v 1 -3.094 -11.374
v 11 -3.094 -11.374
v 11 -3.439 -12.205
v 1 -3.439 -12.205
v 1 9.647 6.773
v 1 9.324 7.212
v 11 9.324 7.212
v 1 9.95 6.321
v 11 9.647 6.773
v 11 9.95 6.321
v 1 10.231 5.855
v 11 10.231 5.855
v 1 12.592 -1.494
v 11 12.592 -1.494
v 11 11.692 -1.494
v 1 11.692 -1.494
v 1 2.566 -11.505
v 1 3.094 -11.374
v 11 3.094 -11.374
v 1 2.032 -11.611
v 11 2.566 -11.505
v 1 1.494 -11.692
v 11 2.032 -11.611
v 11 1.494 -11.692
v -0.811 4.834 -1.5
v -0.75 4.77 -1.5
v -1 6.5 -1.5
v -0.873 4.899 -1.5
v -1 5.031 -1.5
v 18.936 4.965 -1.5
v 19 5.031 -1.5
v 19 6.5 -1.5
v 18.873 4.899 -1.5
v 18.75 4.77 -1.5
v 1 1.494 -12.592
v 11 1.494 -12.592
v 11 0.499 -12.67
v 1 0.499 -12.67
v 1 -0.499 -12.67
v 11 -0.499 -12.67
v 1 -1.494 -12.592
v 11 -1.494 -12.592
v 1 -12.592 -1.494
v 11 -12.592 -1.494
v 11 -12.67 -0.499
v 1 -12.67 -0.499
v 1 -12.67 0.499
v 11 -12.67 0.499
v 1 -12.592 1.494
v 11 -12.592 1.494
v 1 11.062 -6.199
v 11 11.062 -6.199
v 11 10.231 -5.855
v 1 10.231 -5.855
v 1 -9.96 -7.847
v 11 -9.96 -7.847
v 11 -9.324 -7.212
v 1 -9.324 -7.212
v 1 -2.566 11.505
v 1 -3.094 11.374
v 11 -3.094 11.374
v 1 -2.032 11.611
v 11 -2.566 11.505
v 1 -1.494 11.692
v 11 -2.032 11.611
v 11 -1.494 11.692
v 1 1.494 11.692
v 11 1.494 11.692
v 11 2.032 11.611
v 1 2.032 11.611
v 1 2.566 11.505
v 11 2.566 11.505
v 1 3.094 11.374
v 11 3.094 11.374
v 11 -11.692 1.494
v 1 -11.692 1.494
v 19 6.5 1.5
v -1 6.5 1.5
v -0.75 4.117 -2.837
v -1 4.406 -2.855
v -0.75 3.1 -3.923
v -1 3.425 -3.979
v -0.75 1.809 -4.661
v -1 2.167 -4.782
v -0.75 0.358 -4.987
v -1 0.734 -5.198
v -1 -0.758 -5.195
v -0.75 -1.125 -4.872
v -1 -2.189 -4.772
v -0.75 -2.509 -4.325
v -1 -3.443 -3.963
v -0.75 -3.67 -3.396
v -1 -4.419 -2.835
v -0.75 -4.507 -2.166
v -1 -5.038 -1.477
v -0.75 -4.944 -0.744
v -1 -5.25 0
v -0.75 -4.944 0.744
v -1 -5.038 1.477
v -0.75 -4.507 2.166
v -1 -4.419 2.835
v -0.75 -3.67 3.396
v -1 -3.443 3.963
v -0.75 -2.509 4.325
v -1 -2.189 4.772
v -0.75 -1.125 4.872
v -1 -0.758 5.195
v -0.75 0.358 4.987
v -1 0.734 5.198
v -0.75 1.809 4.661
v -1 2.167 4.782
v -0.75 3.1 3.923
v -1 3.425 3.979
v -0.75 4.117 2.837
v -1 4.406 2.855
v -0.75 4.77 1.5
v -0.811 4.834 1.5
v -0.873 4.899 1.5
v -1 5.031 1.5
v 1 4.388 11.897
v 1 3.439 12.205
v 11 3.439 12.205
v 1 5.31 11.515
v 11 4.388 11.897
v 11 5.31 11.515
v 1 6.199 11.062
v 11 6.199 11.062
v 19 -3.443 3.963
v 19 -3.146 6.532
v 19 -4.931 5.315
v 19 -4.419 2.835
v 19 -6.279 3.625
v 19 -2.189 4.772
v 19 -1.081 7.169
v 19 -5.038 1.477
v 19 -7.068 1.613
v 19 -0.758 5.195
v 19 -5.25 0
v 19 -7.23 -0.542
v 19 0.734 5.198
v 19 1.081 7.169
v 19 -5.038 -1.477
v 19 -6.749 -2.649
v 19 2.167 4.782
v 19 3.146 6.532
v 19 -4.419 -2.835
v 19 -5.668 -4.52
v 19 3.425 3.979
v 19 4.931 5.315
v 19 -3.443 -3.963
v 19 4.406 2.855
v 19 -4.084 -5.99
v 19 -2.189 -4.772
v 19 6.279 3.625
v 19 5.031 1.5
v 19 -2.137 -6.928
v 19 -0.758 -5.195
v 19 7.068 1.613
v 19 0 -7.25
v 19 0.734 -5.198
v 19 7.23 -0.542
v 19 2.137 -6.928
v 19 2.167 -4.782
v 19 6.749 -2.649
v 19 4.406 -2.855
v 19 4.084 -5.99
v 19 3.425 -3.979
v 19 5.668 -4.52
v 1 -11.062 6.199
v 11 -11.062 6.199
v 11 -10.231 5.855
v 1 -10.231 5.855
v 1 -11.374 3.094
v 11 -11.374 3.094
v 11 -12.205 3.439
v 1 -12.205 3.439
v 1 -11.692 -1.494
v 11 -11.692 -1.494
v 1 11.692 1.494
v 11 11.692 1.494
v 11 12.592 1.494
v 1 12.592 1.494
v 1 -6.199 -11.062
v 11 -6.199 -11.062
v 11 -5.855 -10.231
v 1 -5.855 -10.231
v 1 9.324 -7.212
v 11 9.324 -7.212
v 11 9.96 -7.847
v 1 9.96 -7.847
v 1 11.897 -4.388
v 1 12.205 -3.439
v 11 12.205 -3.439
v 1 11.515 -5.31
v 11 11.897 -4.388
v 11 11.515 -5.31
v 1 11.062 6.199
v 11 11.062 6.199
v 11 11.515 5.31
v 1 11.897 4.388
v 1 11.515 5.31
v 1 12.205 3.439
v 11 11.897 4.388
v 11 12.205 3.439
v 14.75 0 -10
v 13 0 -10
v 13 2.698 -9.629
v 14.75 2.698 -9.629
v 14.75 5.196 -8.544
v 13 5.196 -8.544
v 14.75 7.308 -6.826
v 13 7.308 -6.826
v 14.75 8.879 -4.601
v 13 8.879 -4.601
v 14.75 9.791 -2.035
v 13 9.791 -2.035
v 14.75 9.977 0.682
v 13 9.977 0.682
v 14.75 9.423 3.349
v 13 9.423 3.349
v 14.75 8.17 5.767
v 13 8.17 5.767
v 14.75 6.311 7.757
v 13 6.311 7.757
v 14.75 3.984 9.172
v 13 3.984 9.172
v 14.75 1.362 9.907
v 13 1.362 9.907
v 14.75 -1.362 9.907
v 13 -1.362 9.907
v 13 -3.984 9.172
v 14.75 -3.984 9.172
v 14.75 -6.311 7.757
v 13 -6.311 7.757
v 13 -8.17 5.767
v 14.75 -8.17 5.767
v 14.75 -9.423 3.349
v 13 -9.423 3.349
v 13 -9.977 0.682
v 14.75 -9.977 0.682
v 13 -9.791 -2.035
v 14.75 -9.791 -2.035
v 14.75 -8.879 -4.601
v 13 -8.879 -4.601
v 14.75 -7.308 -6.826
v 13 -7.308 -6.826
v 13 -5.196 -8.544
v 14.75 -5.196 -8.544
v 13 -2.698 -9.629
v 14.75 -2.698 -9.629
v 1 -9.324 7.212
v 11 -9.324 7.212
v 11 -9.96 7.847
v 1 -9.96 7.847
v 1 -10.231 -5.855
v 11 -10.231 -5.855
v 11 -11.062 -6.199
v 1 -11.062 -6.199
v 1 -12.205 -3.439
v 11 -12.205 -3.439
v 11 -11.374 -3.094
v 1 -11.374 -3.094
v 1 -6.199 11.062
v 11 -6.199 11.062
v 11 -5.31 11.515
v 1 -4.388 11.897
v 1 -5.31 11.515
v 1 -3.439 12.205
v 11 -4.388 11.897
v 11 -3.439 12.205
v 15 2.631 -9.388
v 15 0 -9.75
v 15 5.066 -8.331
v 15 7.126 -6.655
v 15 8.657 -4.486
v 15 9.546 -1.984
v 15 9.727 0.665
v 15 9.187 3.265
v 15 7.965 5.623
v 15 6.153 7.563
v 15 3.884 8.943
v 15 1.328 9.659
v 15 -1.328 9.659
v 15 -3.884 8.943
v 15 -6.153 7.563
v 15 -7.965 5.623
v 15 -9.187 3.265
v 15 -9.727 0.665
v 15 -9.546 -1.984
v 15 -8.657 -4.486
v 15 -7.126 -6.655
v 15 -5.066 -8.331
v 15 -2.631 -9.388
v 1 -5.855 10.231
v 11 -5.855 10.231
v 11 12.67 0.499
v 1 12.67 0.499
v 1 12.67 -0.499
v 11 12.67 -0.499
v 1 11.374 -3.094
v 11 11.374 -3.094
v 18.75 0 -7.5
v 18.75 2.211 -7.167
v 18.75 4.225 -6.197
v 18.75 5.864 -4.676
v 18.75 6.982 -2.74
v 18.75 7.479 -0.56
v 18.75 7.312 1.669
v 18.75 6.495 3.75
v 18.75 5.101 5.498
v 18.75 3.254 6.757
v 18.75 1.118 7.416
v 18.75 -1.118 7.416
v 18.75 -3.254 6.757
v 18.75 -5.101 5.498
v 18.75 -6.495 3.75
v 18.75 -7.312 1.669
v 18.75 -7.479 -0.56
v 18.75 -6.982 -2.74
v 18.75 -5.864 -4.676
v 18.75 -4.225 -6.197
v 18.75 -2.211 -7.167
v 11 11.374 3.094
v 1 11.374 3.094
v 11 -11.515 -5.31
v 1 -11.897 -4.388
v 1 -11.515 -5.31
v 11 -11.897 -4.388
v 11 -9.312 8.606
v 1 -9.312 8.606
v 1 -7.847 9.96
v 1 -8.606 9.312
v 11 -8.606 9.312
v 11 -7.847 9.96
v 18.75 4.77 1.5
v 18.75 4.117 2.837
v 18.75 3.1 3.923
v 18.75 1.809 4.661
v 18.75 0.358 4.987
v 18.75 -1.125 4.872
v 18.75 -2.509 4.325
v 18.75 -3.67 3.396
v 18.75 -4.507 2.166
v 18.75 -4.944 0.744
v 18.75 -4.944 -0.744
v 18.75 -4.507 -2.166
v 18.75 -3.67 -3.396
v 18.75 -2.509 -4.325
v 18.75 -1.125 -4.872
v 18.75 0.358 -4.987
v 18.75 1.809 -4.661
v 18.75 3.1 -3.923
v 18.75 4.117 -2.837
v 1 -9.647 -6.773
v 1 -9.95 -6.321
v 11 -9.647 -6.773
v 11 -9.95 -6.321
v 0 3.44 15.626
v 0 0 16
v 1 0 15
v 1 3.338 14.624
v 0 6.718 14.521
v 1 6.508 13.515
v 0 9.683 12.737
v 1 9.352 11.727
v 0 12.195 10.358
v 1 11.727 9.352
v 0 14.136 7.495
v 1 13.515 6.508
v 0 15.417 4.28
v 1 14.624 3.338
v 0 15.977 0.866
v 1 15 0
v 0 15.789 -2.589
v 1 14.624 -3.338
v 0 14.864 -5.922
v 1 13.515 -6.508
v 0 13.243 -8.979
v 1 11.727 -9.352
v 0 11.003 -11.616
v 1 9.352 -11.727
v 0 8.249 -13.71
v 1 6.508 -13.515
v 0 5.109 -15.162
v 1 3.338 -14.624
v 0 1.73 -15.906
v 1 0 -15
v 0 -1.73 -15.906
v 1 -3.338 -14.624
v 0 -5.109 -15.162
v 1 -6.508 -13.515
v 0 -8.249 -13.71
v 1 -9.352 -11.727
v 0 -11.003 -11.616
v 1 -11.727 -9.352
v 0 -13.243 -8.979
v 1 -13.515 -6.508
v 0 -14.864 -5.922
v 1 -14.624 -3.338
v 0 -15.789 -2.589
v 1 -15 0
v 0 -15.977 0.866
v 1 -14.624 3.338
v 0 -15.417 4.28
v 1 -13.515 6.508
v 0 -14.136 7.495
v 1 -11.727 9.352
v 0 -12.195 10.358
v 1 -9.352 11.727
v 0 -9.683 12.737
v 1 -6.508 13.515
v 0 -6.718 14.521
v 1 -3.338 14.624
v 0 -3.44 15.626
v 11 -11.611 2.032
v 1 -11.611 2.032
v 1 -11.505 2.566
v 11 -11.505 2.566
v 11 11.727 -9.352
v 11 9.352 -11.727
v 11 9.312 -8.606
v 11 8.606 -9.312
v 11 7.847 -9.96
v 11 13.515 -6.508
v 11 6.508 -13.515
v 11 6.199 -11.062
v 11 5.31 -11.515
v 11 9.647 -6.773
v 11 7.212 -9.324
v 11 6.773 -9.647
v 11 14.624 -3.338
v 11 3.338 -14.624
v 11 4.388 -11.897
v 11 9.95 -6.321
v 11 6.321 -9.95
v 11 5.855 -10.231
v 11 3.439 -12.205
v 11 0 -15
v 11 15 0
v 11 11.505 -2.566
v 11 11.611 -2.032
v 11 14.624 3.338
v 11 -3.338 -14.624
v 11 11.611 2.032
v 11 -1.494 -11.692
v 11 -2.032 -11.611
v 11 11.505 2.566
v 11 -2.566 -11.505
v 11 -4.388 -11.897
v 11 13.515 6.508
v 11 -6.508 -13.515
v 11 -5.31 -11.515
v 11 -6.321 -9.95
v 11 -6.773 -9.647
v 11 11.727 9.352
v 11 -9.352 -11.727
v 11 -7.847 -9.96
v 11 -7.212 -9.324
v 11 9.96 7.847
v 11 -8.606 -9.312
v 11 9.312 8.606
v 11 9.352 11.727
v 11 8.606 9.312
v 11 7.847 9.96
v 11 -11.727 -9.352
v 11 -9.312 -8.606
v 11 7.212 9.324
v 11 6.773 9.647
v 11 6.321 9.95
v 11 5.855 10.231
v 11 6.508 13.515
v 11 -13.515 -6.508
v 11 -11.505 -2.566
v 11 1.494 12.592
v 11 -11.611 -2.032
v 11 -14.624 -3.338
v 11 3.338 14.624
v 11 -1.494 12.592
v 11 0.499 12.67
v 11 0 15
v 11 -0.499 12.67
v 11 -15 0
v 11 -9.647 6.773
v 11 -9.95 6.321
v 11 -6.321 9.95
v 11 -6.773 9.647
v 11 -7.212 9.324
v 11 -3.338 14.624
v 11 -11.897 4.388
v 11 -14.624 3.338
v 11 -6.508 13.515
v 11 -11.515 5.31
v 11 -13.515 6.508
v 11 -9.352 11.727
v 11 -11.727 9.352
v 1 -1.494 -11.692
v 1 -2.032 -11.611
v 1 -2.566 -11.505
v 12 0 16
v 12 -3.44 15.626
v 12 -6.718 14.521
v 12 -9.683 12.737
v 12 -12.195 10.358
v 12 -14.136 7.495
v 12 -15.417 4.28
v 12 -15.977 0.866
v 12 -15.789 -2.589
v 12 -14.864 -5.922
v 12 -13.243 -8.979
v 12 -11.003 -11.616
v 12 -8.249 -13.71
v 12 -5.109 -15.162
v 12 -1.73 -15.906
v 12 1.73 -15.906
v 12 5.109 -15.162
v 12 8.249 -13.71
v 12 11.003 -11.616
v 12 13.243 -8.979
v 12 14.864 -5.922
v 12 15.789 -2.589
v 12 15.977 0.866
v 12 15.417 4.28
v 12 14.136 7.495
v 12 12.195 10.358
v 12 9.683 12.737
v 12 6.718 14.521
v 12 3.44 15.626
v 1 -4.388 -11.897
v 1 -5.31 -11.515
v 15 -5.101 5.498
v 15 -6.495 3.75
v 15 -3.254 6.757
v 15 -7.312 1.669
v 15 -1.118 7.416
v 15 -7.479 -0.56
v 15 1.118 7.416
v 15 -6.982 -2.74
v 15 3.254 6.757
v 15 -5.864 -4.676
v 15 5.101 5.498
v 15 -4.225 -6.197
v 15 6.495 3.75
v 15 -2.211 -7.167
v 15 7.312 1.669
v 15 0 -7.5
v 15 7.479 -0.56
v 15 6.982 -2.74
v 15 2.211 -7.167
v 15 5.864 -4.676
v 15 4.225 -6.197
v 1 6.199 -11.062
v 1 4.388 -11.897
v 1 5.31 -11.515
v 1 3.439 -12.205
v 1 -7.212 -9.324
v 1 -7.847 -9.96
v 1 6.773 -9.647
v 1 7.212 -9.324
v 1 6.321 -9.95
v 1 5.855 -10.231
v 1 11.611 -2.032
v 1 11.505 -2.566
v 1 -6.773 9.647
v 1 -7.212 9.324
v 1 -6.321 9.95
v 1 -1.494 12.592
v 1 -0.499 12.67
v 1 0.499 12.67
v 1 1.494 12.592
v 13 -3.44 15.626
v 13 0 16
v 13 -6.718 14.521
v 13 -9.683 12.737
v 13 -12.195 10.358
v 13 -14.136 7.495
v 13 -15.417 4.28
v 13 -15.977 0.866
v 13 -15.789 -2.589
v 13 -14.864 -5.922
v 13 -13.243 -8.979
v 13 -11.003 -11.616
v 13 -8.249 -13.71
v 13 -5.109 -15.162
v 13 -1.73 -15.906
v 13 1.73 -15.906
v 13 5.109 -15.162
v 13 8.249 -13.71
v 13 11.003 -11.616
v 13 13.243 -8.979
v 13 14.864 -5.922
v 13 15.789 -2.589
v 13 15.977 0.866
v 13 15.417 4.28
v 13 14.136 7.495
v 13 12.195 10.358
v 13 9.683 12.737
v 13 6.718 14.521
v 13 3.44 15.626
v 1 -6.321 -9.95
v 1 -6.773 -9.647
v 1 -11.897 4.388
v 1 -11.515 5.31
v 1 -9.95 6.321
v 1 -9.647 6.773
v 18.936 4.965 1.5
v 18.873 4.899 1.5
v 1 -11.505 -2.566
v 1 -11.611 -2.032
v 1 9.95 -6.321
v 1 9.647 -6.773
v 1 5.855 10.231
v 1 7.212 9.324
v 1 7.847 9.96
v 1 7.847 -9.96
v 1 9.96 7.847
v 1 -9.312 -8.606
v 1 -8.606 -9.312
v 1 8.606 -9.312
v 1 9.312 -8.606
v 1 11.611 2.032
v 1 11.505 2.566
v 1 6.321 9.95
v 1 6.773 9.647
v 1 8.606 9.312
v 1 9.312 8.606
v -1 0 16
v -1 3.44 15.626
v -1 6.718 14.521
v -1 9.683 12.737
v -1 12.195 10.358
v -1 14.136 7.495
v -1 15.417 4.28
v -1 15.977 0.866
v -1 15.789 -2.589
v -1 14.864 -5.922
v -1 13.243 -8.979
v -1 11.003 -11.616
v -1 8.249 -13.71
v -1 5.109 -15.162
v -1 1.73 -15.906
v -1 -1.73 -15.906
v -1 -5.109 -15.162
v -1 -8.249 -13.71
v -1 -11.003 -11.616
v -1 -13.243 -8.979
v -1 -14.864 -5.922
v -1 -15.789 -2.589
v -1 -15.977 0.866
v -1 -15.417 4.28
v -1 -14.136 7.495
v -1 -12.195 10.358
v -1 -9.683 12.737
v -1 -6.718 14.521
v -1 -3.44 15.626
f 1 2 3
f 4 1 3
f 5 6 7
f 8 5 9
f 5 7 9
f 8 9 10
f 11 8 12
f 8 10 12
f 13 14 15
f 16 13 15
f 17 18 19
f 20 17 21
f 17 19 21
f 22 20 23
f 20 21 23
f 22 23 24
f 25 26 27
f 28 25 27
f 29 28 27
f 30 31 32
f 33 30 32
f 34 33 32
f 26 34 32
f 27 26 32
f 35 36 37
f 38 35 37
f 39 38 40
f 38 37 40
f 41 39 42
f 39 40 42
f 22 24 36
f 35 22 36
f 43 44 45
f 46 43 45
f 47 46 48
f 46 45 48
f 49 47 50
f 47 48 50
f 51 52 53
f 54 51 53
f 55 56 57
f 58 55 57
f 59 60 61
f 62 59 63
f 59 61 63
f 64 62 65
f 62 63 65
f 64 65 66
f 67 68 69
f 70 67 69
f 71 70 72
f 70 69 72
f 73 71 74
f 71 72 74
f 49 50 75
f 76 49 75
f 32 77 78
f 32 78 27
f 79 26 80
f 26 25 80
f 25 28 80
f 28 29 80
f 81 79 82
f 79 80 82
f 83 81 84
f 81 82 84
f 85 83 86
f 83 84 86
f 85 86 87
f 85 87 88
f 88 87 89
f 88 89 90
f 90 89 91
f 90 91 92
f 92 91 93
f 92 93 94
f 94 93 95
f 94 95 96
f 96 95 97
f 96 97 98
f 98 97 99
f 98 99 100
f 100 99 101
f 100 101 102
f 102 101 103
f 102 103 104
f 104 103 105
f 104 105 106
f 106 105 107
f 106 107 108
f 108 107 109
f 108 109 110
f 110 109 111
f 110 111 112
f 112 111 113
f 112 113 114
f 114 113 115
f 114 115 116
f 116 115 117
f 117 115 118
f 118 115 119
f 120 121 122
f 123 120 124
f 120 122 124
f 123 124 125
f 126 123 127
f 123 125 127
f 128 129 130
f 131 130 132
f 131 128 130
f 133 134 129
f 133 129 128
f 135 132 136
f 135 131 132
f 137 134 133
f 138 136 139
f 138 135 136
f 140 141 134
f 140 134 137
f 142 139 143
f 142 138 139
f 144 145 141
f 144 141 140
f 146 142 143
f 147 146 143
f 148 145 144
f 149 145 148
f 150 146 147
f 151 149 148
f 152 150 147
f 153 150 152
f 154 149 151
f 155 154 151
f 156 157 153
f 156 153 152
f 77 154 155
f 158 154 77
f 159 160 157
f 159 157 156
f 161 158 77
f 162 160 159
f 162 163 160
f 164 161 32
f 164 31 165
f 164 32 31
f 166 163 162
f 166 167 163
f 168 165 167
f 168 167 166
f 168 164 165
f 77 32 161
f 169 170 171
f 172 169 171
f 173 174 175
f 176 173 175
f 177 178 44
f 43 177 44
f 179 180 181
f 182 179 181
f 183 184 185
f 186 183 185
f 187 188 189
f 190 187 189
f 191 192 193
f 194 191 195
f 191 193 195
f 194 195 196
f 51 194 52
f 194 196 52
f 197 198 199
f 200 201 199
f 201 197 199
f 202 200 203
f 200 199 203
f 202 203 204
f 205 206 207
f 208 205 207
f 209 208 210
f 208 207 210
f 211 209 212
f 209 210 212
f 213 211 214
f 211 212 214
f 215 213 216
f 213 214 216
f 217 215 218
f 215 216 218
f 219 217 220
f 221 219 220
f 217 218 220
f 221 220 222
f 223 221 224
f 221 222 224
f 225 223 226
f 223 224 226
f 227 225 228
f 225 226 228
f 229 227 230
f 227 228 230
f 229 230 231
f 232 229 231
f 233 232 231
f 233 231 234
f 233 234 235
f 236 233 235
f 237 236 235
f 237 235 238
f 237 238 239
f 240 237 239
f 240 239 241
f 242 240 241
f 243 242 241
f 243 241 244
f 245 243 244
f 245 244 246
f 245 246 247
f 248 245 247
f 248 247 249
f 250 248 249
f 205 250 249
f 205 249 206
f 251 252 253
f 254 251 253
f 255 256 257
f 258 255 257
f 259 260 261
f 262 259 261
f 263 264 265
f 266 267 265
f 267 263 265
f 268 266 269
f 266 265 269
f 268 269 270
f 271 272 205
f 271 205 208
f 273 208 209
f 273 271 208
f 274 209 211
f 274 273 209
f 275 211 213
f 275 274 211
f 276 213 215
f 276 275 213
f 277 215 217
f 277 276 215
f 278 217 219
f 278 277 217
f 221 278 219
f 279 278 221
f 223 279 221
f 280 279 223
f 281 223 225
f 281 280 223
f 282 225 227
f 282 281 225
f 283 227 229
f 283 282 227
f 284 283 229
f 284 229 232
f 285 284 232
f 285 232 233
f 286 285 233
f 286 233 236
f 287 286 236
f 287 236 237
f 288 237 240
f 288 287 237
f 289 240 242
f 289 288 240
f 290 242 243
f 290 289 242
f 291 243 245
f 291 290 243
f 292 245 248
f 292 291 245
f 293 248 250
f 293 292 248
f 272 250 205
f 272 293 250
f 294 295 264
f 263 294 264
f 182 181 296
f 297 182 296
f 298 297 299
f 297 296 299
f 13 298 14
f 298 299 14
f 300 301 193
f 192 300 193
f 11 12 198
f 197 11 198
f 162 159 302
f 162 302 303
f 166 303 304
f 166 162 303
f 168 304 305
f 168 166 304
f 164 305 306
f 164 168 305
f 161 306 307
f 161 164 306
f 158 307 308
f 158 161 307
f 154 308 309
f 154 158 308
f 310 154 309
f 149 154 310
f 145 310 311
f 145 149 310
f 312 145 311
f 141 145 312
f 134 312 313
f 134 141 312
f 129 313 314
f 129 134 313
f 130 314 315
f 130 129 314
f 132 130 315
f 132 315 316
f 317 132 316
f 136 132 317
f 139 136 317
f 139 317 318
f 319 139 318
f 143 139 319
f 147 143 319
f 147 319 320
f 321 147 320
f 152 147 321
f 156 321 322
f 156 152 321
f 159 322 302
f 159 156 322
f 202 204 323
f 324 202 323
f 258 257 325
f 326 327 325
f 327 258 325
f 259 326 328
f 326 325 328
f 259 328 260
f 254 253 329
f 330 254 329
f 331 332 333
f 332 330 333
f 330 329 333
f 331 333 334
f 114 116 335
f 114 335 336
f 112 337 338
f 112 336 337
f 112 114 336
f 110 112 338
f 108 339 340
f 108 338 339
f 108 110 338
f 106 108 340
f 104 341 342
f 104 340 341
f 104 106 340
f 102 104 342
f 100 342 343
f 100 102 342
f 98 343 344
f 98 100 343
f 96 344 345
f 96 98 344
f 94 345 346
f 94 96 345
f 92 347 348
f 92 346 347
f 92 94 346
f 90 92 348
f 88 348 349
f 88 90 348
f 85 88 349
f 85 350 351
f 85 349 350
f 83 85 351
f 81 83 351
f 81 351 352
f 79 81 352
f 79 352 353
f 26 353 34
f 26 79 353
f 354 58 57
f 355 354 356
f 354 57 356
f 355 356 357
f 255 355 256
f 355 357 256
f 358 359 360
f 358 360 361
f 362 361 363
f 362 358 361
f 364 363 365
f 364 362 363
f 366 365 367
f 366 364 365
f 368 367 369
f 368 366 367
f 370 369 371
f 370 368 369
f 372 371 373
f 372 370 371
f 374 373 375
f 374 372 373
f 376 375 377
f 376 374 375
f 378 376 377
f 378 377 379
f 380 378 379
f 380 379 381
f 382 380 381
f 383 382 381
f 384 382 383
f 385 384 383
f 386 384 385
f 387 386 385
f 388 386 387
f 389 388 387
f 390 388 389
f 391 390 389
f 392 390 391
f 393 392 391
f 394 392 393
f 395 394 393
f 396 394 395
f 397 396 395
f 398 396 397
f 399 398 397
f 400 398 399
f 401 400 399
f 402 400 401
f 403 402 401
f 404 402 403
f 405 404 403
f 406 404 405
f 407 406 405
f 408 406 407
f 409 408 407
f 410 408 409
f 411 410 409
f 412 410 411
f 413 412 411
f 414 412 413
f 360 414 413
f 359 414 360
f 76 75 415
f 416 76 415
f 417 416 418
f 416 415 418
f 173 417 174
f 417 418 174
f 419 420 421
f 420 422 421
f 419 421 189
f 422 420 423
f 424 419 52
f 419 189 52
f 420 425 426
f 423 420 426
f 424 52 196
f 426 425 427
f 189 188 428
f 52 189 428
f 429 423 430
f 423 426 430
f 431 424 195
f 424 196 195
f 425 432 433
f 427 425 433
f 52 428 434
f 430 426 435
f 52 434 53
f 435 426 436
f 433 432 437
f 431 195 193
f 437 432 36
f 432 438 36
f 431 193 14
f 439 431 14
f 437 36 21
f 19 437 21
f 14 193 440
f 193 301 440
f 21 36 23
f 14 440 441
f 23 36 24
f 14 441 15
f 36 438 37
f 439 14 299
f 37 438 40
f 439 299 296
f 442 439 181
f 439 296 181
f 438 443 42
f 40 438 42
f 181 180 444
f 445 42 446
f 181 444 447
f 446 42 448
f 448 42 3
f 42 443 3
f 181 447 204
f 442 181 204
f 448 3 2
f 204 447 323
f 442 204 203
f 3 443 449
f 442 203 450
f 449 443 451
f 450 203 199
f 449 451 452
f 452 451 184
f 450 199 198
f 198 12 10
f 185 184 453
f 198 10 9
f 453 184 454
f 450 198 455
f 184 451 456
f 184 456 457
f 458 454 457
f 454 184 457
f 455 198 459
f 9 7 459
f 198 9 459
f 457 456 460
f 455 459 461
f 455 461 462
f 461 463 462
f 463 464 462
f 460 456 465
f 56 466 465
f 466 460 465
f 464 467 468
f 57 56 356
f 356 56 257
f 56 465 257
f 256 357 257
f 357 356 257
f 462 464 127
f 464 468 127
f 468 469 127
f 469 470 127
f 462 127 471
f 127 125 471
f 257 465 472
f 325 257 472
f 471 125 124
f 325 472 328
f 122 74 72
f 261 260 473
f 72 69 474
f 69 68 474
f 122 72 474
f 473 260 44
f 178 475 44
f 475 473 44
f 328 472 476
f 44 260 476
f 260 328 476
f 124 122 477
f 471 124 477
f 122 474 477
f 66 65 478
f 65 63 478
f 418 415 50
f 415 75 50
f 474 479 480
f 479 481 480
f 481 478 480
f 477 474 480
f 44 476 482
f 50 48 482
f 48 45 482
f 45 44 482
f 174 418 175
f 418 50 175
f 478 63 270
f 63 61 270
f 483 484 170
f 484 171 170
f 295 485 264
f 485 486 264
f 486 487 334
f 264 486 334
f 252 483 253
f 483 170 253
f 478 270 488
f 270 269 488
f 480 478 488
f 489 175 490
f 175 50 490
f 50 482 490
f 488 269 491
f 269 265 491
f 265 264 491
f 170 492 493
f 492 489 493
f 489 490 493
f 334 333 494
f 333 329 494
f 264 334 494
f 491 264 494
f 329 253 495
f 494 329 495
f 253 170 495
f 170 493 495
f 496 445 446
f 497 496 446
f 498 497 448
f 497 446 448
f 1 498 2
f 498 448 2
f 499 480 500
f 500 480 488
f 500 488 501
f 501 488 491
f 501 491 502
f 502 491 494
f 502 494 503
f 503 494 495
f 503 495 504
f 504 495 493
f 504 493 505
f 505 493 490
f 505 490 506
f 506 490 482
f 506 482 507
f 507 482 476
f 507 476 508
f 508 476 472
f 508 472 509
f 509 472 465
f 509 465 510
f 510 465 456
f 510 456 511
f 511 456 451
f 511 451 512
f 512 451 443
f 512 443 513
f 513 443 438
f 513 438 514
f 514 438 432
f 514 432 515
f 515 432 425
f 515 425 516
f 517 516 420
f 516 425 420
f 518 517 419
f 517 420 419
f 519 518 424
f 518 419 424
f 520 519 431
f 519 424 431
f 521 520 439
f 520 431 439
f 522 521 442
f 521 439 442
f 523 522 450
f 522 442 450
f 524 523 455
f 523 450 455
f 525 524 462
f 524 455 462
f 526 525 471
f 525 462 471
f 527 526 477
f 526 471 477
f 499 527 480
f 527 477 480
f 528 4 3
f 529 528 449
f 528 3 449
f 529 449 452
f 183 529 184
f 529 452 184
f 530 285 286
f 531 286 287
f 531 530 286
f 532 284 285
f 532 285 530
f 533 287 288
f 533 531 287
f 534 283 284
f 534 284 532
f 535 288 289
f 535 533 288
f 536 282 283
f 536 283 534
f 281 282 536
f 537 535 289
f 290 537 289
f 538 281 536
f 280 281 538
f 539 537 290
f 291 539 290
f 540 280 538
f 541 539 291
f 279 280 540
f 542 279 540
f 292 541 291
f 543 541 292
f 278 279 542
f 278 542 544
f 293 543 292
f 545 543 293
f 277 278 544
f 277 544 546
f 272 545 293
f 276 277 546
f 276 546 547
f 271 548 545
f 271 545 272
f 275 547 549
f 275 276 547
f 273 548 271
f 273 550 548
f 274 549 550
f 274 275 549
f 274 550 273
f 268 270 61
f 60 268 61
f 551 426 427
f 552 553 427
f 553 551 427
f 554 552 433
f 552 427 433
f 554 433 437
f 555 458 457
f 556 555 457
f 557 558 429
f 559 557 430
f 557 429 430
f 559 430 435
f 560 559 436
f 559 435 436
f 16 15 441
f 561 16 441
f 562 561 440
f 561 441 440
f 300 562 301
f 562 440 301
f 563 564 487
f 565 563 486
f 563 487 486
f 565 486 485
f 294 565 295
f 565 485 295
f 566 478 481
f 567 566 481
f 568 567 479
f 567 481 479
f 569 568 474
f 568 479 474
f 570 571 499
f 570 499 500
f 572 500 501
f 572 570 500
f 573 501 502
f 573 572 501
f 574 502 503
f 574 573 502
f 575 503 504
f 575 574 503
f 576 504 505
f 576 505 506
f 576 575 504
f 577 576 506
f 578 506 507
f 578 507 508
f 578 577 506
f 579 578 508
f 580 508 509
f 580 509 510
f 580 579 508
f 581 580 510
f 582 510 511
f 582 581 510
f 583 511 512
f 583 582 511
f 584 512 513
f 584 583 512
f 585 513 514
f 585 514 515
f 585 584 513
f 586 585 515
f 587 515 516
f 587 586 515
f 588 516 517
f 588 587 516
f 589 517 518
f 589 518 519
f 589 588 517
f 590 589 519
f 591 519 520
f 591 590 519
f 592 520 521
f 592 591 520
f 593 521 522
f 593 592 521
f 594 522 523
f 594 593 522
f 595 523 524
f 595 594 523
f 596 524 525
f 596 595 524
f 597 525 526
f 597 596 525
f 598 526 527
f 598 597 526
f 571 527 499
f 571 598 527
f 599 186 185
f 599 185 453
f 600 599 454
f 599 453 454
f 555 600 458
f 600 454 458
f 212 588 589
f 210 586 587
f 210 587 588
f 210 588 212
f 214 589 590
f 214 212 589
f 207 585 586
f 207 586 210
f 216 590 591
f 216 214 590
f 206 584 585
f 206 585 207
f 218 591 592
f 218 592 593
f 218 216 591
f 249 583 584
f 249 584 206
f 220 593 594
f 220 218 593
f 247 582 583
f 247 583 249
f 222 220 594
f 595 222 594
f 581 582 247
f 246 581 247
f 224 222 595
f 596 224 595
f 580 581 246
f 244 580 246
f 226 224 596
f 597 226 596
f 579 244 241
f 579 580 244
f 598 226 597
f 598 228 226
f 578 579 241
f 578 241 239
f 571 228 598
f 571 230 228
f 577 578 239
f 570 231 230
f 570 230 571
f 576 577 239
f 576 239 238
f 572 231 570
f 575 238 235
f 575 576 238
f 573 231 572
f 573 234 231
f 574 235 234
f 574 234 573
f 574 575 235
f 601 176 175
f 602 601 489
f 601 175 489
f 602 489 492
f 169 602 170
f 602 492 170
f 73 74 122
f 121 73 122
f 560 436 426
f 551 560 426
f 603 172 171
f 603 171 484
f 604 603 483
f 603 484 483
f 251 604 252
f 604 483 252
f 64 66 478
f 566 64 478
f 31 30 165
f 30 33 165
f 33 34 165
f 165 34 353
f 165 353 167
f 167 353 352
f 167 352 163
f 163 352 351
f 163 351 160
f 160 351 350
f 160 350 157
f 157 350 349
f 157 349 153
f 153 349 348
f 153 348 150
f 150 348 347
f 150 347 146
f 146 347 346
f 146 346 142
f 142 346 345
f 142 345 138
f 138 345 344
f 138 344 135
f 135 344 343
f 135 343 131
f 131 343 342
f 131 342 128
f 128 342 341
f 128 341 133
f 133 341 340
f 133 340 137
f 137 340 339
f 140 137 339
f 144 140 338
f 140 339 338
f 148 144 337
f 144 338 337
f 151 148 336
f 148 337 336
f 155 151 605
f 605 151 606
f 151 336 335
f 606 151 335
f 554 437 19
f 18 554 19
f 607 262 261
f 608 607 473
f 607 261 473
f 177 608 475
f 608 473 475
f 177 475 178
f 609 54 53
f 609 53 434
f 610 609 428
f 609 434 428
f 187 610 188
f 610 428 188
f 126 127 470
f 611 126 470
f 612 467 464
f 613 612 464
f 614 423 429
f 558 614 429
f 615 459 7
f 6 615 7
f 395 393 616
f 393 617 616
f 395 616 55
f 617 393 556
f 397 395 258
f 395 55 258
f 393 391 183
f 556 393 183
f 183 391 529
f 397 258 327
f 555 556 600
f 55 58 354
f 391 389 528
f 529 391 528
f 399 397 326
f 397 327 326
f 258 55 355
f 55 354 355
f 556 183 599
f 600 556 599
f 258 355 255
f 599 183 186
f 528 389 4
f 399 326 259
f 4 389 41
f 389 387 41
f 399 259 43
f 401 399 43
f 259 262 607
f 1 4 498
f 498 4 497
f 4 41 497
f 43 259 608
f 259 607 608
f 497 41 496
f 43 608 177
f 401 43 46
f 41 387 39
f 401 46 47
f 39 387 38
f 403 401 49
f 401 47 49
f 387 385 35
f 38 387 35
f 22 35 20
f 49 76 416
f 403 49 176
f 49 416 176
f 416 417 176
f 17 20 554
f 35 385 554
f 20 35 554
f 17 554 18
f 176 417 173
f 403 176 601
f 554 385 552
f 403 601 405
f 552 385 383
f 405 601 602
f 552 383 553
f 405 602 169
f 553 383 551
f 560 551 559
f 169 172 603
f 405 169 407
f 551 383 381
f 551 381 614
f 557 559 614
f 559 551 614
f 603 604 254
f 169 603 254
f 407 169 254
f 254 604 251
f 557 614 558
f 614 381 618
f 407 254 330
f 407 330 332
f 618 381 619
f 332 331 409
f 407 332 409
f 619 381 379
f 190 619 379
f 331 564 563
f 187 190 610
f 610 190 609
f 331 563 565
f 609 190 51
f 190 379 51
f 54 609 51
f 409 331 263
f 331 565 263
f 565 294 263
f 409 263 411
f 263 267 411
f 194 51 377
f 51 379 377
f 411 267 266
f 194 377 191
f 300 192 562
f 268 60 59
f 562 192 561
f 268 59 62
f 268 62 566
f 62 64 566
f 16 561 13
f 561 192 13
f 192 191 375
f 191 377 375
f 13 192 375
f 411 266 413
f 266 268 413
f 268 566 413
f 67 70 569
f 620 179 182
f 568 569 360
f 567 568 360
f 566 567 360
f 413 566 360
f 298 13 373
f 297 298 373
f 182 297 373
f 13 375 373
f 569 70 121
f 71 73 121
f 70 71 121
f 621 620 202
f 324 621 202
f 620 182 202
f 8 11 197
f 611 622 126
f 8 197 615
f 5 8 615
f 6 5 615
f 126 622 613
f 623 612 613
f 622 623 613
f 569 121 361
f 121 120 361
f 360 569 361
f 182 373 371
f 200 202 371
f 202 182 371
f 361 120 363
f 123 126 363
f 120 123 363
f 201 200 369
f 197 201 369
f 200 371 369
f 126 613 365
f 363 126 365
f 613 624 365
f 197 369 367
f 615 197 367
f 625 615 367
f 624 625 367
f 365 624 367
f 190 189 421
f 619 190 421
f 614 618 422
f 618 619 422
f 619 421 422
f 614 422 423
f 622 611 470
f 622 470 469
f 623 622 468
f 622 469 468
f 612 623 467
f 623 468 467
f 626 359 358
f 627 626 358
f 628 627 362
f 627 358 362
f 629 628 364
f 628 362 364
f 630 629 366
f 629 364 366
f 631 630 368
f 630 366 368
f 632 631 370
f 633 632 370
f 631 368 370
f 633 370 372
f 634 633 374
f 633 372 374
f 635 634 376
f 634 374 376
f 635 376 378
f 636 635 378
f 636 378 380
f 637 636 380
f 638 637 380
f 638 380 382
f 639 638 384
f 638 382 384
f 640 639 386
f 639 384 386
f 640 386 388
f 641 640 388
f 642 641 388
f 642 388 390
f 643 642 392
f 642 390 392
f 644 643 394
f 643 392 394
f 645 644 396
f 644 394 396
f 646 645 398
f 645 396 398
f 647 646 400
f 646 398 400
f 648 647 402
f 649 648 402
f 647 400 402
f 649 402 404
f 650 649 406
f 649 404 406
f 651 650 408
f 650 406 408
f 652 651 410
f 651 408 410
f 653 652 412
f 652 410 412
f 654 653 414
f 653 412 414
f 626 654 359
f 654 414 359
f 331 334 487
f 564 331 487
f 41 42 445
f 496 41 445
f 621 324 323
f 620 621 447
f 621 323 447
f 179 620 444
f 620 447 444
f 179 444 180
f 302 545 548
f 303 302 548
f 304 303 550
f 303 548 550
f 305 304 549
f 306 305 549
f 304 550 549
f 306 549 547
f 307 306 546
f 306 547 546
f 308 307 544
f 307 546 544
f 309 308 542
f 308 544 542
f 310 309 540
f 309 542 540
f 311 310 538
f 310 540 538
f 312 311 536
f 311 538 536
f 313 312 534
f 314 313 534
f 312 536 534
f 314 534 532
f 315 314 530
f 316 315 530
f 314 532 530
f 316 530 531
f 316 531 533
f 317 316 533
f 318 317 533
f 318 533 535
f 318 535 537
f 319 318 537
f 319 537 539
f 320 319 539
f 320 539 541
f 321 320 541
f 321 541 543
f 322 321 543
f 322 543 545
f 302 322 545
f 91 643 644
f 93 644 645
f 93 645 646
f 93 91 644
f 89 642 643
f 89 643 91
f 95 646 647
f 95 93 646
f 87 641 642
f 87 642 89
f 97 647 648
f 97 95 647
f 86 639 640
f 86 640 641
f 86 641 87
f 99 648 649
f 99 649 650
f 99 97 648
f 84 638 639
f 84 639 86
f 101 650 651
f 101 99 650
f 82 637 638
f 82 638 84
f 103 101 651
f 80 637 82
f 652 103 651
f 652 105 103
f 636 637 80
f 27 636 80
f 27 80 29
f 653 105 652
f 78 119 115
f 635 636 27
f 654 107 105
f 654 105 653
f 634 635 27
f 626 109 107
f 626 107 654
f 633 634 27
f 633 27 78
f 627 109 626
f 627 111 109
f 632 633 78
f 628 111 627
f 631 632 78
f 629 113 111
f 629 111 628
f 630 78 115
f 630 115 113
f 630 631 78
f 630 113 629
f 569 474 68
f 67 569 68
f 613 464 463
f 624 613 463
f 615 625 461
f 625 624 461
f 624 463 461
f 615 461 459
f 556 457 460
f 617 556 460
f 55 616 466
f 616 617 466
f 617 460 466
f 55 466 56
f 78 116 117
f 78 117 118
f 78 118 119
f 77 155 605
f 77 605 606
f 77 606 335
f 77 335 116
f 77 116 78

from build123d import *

# Parameters (mm, degrees)
BOSS_EXTRUDE1_START       = -13
BOSS_EXTRUDE1_DEPTH       = 14
BOSS_EXTRUDE1_START_2     = -25
BOSS_EXTRUDE1_2_OUTLINE_R = 9
BOSS_EXTRUDE1_2_DEPTH     = 12
BOSS_EXTRUDE1_START_3     = -1
BOSS_EXTRUDE1_3_OUTLINE_R = 16
BOSS_EXTRUDE1_3_DEPTH     = 2
BOSS_EXTRUDE1_4_OUTLINE_R = 14.25
BOSS_EXTRUDE1_4_DEPTH     = 0.9999999
SKETCH5_R                 = 16
BOSS_EXTRUDE3_DEPTH       = 2
SKETCH6_R                 = 10
BOSS_EXTRUDE4_DEPTH       = 12
CHAMFER1_SIZE             = 1
CUT_EXTRUDE1_START        = -10
SKETCH2_R                 = 10
SKETCH2_R_2               = 7.5
CUT_EXTRUDE1_DEPTH        = 10
CUT_EXTRUDE2_DEPTH        = 28.712812921
CUT_EXTRUDE2_DEPTH_BACK   = 28.712812921
SKETCH4_R                 = 5
CUT_EXTRUDE3_START        = -6
SKETCH7_R                 = 7.5
CUT_EXTRUDE3_DEPTH        = 6
CHAMFER2_SIZE             = 0.25
SKETCH8_W                 = 3
SKETCH8_H                 = 3
CUT_EXTRUDE4_DEPTH        = 31.199337741


with BuildPart() as part:
    # Boss-Extrude1: read off the stored shape, not the designer's step
    # Boss-Extrude1 outline → Boss-Extrude1 (new body)
    with BuildSketch(Plane.ZY.offset(BOSS_EXTRUDE1_START)):
        with BuildLine():
            ThreePointArc((-1.493827307, 11.692460658), (-2.299627171, 11.561006493), (-3.094394503, 11.374088047))
            Line((-3.094394503, 11.374088047), (-3.438518062, 12.20487581))
            ThreePointArc((-3.438518062, 12.20487581), (-4.852425922, 11.714792472), (-6.19875101, 11.061549888))
            Line((-6.19875101, 11.061549888), (-5.854627451, 10.230762125))
            ThreePointArc((-5.854627451, 10.230762125), (-6.548784122, 9.800948055), (-7.211522801, 9.324113638))
            Line((-7.211522801, 9.324113638), (-7.847380226, 9.959971063))
            ThreePointArc((-7.847380226, 9.959971063), (-8.966113985, 8.966113985), (-9.959971063, 7.847380226))
            Line((-9.959971063, 7.847380226), (-9.324113638, 7.211522801))
            ThreePointArc((-9.324113638, 7.211522801), (-9.800948055, 6.548784122), (-10.230762125, 5.854627451))
            Line((-10.230762125, 5.854627451), (-11.061549888, 6.19875101))
            ThreePointArc((-11.061549888, 6.19875101), (-11.714792472, 4.852425922), (-12.20487581, 3.438518062))
            Line((-12.20487581, 3.438518062), (-11.374088047, 3.094394503))
            ThreePointArc((-11.374088047, 3.094394503), (-11.561006493, 2.299627171), (-11.692460658, 1.493827307))
            Line((-11.692460658, 1.493827307), (-12.591698852, 1.493827307))
            ThreePointArc((-12.591698852, 1.493827307), (-12.68, 0), (-12.591698852, -1.493827307))
            Line((-12.591698852, -1.493827307), (-11.692460658, -1.493827307))
            ThreePointArc((-11.692460658, -1.493827307), (-11.561006493, -2.299627171), (-11.374088047, -3.094394503))
            Line((-11.374088047, -3.094394503), (-12.20487581, -3.438518062))
            ThreePointArc((-12.20487581, -3.438518062), (-11.714792472, -4.852425922), (-11.061549888, -6.19875101))
            Line((-11.061549888, -6.19875101), (-10.230762125, -5.854627451))
            ThreePointArc((-10.230762125, -5.854627451), (-9.800948055, -6.548784122), (-9.324113638, -7.211522801))
            Line((-9.324113638, -7.211522801), (-9.959971063, -7.847380226))
            ThreePointArc((-9.959971063, -7.847380226), (-8.966113985, -8.966113985), (-7.847380226, -9.959971063))
            Line((-7.847380226, -9.959971063), (-7.211522801, -9.324113638))
            ThreePointArc((-7.211522801, -9.324113638), (-6.548784122, -9.800948055), (-5.854627451, -10.230762125))
            Line((-5.854627451, -10.230762125), (-6.19875101, -11.061549888))
            ThreePointArc((-6.19875101, -11.061549888), (-4.852425922, -11.714792472), (-3.438518062, -12.20487581))
            Line((-3.438518062, -12.20487581), (-3.094394503, -11.374088047))
            ThreePointArc((-3.094394503, -11.374088047), (-2.299627171, -11.561006493), (-1.493827307, -11.692460658))
            Line((-1.493827307, -11.692460658), (-1.493827307, -12.591698852))
            ThreePointArc((-1.493827307, -12.591698852), (0, -12.68), (1.493827307, -12.591698852))
            Line((1.493827307, -12.591698852), (1.493827307, -11.692460658))
            ThreePointArc((1.493827307, -11.692460658), (2.299627171, -11.561006493), (3.094394503, -11.374088047))
            Line((3.094394503, -11.374088047), (3.438518062, -12.20487581))
            ThreePointArc((3.438518062, -12.20487581), (4.852425922, -11.714792472), (6.19875101, -11.061549888))
            Line((6.19875101, -11.061549888), (5.854627451, -10.230762125))
            ThreePointArc((5.854627451, -10.230762125), (6.548784122, -9.800948055), (7.211522801, -9.324113638))
            Line((7.211522801, -9.324113638), (7.847380226, -9.959971063))
            ThreePointArc((7.847380226, -9.959971063), (8.966113985, -8.966113985), (9.959971063, -7.847380226))
            Line((9.959971063, -7.847380226), (9.324113638, -7.211522801))
            ThreePointArc((9.324113638, -7.211522801), (9.800948055, -6.548784122), (10.230762125, -5.854627451))
            Line((10.230762125, -5.854627451), (11.061549888, -6.19875101))
            ThreePointArc((11.061549888, -6.19875101), (11.714792472, -4.852425922), (12.20487581, -3.438518062))
            Line((12.20487581, -3.438518062), (11.374088047, -3.094394503))
            ThreePointArc((11.374088047, -3.094394503), (11.561006493, -2.299627171), (11.692460658, -1.493827307))
            Line((11.692460658, -1.493827307), (12.591698852, -1.493827307))
            ThreePointArc((12.591698852, -1.493827307), (12.68, 0), (12.591698852, 1.493827307))
            Line((12.591698852, 1.493827307), (11.692460658, 1.493827307))
            ThreePointArc((11.692460658, 1.493827307), (11.561006493, 2.299627171), (11.374088047, 3.094394503))
            Line((11.374088047, 3.094394503), (12.20487581, 3.438518062))
            ThreePointArc((12.20487581, 3.438518062), (11.714792472, 4.852425922), (11.061549888, 6.19875101))
            Line((11.061549888, 6.19875101), (10.230762125, 5.854627451))
            ThreePointArc((10.230762125, 5.854627451), (9.800948055, 6.548784122), (9.324113638, 7.211522801))
            Line((9.324113638, 7.211522801), (9.959971063, 7.847380226))
            ThreePointArc((9.959971063, 7.847380226), (8.966113985, 8.966113985), (7.847380226, 9.959971063))
            Line((7.847380226, 9.959971063), (7.211522801, 9.324113638))
            ThreePointArc((7.211522801, 9.324113638), (6.548784122, 9.800948055), (5.854627451, 10.230762125))
            Line((5.854627451, 10.230762125), (6.19875101, 11.061549888))
            ThreePointArc((6.19875101, 11.061549888), (4.852425922, 11.714792472), (3.438518062, 12.20487581))
            Line((3.438518062, 12.20487581), (3.094394503, 11.374088047))
            ThreePointArc((3.094394503, 11.374088047), (2.299627171, 11.561006493), (1.493827307, 11.692460658))
            Line((1.493827307, 11.692460658), (1.493827307, 12.591698852))
            ThreePointArc((1.493827307, 12.591698852), (0, 12.68), (-1.493827307, 12.591698852))
            Line((-1.493827307, 12.591698852), (-1.493827307, 11.692460658))
        make_face()
    extrude(amount=BOSS_EXTRUDE1_DEPTH)

    # Boss-Extrude1 2 outline → Boss-Extrude1 2 (add)
    with BuildSketch(Plane.ZY.offset(BOSS_EXTRUDE1_START_2)):
        Circle(BOSS_EXTRUDE1_2_OUTLINE_R)
    extrude(amount=BOSS_EXTRUDE1_2_DEPTH)

    # Boss-Extrude1 3 outline → Boss-Extrude1 3 (add)
    with BuildSketch(Plane.ZY.offset(BOSS_EXTRUDE1_START_3)):
        Circle(BOSS_EXTRUDE1_3_OUTLINE_R)
        with BuildLine():
            Line((-3.438518062, 12.20487581), (-3.094394503, 11.374088047))
            ThreePointArc((-3.094394503, 11.374088047), (-2.299627171, 11.561006493), (-1.493827307, 11.692460658))
            Line((-1.493827307, 11.692460658), (-1.493827307, 12.591698852))
            ThreePointArc((-1.493827307, 12.591698852), (0, 12.68), (1.493827307, 12.591698852))
            Line((1.493827307, 12.591698852), (1.493827307, 11.692460658))
            ThreePointArc((1.493827307, 11.692460658), (2.299627171, 11.561006493), (3.094394503, 11.374088047))
            Line((3.094394503, 11.374088047), (3.438518062, 12.20487581))
            ThreePointArc((3.438518062, 12.20487581), (4.852425922, 11.714792472), (6.19875101, 11.061549888))
            Line((6.19875101, 11.061549888), (5.854627451, 10.230762125))
            ThreePointArc((5.854627451, 10.230762125), (6.548784122, 9.800948055), (7.211522801, 9.324113638))
            Line((7.211522801, 9.324113638), (7.847380226, 9.959971063))
            ThreePointArc((7.847380226, 9.959971063), (8.966113985, 8.966113985), (9.959971063, 7.847380226))
            Line((9.959971063, 7.847380226), (9.324113638, 7.211522801))
            ThreePointArc((9.324113638, 7.211522801), (9.800948055, 6.548784122), (10.230762125, 5.854627451))
            Line((10.230762125, 5.854627451), (11.061549888, 6.19875101))
            ThreePointArc((11.061549888, 6.19875101), (11.714792472, 4.852425922), (12.20487581, 3.438518062))
            Line((12.20487581, 3.438518062), (11.374088047, 3.094394503))
            ThreePointArc((11.374088047, 3.094394503), (11.561006493, 2.299627171), (11.692460658, 1.493827307))
            Line((11.692460658, 1.493827307), (12.591698852, 1.493827307))
            ThreePointArc((12.591698852, 1.493827307), (12.68, 0), (12.591698852, -1.493827307))
            Line((12.591698852, -1.493827307), (11.692460658, -1.493827307))
            ThreePointArc((11.692460658, -1.493827307), (11.561006493, -2.299627171), (11.374088047, -3.094394503))
            Line((11.374088047, -3.094394503), (12.20487581, -3.438518062))
            ThreePointArc((12.20487581, -3.438518062), (11.714792472, -4.852425922), (11.061549888, -6.19875101))
            Line((11.061549888, -6.19875101), (10.230762125, -5.854627451))
            ThreePointArc((10.230762125, -5.854627451), (9.800948055, -6.548784122), (9.324113638, -7.211522801))
            Line((9.324113638, -7.211522801), (9.959971063, -7.847380226))
            ThreePointArc((9.959971063, -7.847380226), (8.966113985, -8.966113985), (7.847380226, -9.959971063))
            Line((7.847380226, -9.959971063), (7.211522801, -9.324113638))
            ThreePointArc((7.211522801, -9.324113638), (6.548784122, -9.800948055), (5.854627451, -10.230762125))
            Line((5.854627451, -10.230762125), (6.19875101, -11.061549888))
            ThreePointArc((6.19875101, -11.061549888), (4.852425922, -11.714792472), (3.438518062, -12.20487581))
            Line((3.438518062, -12.20487581), (3.094394503, -11.374088047))
            ThreePointArc((3.094394503, -11.374088047), (2.299627171, -11.561006493), (1.493827307, -11.692460658))
            Line((1.493827307, -11.692460658), (1.493827307, -12.591698852))
            ThreePointArc((1.493827307, -12.591698852), (0, -12.68), (-1.493827307, -12.591698852))
            Line((-1.493827307, -12.591698852), (-1.493827307, -11.692460658))
            ThreePointArc((-1.493827307, -11.692460658), (-2.299627171, -11.561006493), (-3.094394503, -11.374088047))
            Line((-3.094394503, -11.374088047), (-3.438518062, -12.20487581))
            ThreePointArc((-3.438518062, -12.20487581), (-4.852425922, -11.714792472), (-6.19875101, -11.061549888))
            Line((-6.19875101, -11.061549888), (-5.854627451, -10.230762125))
            ThreePointArc((-5.854627451, -10.230762125), (-6.548784122, -9.800948055), (-7.211522801, -9.324113638))
            Line((-7.211522801, -9.324113638), (-7.847380226, -9.959971063))
            ThreePointArc((-7.847380226, -9.959971063), (-8.966113985, -8.966113985), (-9.959971063, -7.847380226))
            Line((-9.959971063, -7.847380226), (-9.324113638, -7.211522801))
            ThreePointArc((-9.324113638, -7.211522801), (-9.800948055, -6.548784122), (-10.230762125, -5.854627451))
            Line((-10.230762125, -5.854627451), (-11.061549888, -6.19875101))
            ThreePointArc((-11.061549888, -6.19875101), (-11.714792472, -4.852425922), (-12.20487581, -3.438518062))
            Line((-12.20487581, -3.438518062), (-11.374088047, -3.094394503))
            ThreePointArc((-11.374088047, -3.094394503), (-11.561006493, -2.299627171), (-11.692460658, -1.493827307))
            Line((-11.692460658, -1.493827307), (-12.591698852, -1.493827307))
            ThreePointArc((-12.591698852, -1.493827307), (-12.68, 0), (-12.591698852, 1.493827307))
            Line((-12.591698852, 1.493827307), (-11.692460658, 1.493827307))
            ThreePointArc((-11.692460658, 1.493827307), (-11.561006493, 2.299627171), (-11.374088047, 3.094394503))
            Line((-11.374088047, 3.094394503), (-12.20487581, 3.438518062))
            ThreePointArc((-12.20487581, 3.438518062), (-11.714792472, 4.852425922), (-11.061549888, 6.19875101))
            Line((-11.061549888, 6.19875101), (-10.230762125, 5.854627451))
            ThreePointArc((-10.230762125, 5.854627451), (-9.800948055, 6.548784122), (-9.324113638, 7.211522801))
            Line((-9.324113638, 7.211522801), (-9.959971063, 7.847380226))
            ThreePointArc((-9.959971063, 7.847380226), (-8.966113985, 8.966113985), (-7.847380226, 9.959971063))
            Line((-7.847380226, 9.959971063), (-7.211522801, 9.324113638))
            ThreePointArc((-7.211522801, 9.324113638), (-6.548784122, 9.800948055), (-5.854627451, 10.230762125))
            Line((-5.854627451, 10.230762125), (-6.19875101, 11.061549888))
            ThreePointArc((-6.19875101, 11.061549888), (-4.852425922, 11.714792472), (-3.438518062, 12.20487581))
        make_face(mode=Mode.SUBTRACT)
    extrude(amount=BOSS_EXTRUDE1_3_DEPTH)

    # Boss-Extrude1 4 outline → Boss-Extrude1 4 (add)
    with BuildSketch(Plane.ZY.offset(BOSS_EXTRUDE1_START)):
        Circle(BOSS_EXTRUDE1_4_OUTLINE_R)
        with BuildLine():
            Line((-3.438518062, 12.20487581), (-3.094394503, 11.374088047))
            ThreePointArc((-3.094394503, 11.374088047), (-2.299627171, 11.561006493), (-1.493827307, 11.692460658))
            Line((-1.493827307, 11.692460658), (-1.493827307, 12.591698852))
            ThreePointArc((-1.493827307, 12.591698852), (0, 12.68), (1.493827307, 12.591698852))
            Line((1.493827307, 12.591698852), (1.493827307, 11.692460658))
            ThreePointArc((1.493827307, 11.692460658), (2.299627171, 11.561006493), (3.094394503, 11.374088047))
            Line((3.094394503, 11.374088047), (3.438518062, 12.20487581))
            ThreePointArc((3.438518062, 12.20487581), (4.852425922, 11.714792472), (6.19875101, 11.061549888))
            Line((6.19875101, 11.061549888), (5.854627451, 10.230762125))
            ThreePointArc((5.854627451, 10.230762125), (6.548784122, 9.800948055), (7.211522801, 9.324113638))
            Line((7.211522801, 9.324113638), (7.847380226, 9.959971063))
            ThreePointArc((7.847380226, 9.959971063), (8.966113985, 8.966113985), (9.959971063, 7.847380226))
            Line((9.959971063, 7.847380226), (9.324113638, 7.211522801))
            ThreePointArc((9.324113638, 7.211522801), (9.800948055, 6.548784122), (10.230762125, 5.854627451))
            Line((10.230762125, 5.854627451), (11.061549888, 6.19875101))
            ThreePointArc((11.061549888, 6.19875101), (11.714792472, 4.852425922), (12.20487581, 3.438518062))
            Line((12.20487581, 3.438518062), (11.374088047, 3.094394503))
            ThreePointArc((11.374088047, 3.094394503), (11.561006493, 2.299627171), (11.692460658, 1.493827307))
            Line((11.692460658, 1.493827307), (12.591698852, 1.493827307))
            ThreePointArc((12.591698852, 1.493827307), (12.68, 0), (12.591698852, -1.493827307))
            Line((12.591698852, -1.493827307), (11.692460658, -1.493827307))
            ThreePointArc((11.692460658, -1.493827307), (11.561006493, -2.299627171), (11.374088047, -3.094394503))
            Line((11.374088047, -3.094394503), (12.20487581, -3.438518062))
            ThreePointArc((12.20487581, -3.438518062), (11.714792472, -4.852425922), (11.061549888, -6.19875101))
            Line((11.061549888, -6.19875101), (10.230762125, -5.854627451))
            ThreePointArc((10.230762125, -5.854627451), (9.800948055, -6.548784122), (9.324113638, -7.211522801))
            Line((9.324113638, -7.211522801), (9.959971063, -7.847380226))
            ThreePointArc((9.959971063, -7.847380226), (8.966113985, -8.966113985), (7.847380226, -9.959971063))
            Line((7.847380226, -9.959971063), (7.211522801, -9.324113638))
            ThreePointArc((7.211522801, -9.324113638), (6.548784122, -9.800948055), (5.854627451, -10.230762125))
            Line((5.854627451, -10.230762125), (6.19875101, -11.061549888))
            ThreePointArc((6.19875101, -11.061549888), (4.852425922, -11.714792472), (3.438518062, -12.20487581))
            Line((3.438518062, -12.20487581), (3.094394503, -11.374088047))
            ThreePointArc((3.094394503, -11.374088047), (2.299627171, -11.561006493), (1.493827307, -11.692460658))
            Line((1.493827307, -11.692460658), (1.493827307, -12.591698852))
            ThreePointArc((1.493827307, -12.591698852), (0, -12.68), (-1.493827307, -12.591698852))
            Line((-1.493827307, -12.591698852), (-1.493827307, -11.692460658))
            ThreePointArc((-1.493827307, -11.692460658), (-2.299627171, -11.561006493), (-3.094394503, -11.374088047))
            Line((-3.094394503, -11.374088047), (-3.438518062, -12.20487581))
            ThreePointArc((-3.438518062, -12.20487581), (-4.852425922, -11.714792472), (-6.19875101, -11.061549888))
            Line((-6.19875101, -11.061549888), (-5.854627451, -10.230762125))
            ThreePointArc((-5.854627451, -10.230762125), (-6.548784122, -9.800948055), (-7.211522801, -9.324113638))
            Line((-7.211522801, -9.324113638), (-7.847380226, -9.959971063))
            ThreePointArc((-7.847380226, -9.959971063), (-8.966113985, -8.966113985), (-9.959971063, -7.847380226))
            Line((-9.959971063, -7.847380226), (-9.324113638, -7.211522801))
            ThreePointArc((-9.324113638, -7.211522801), (-9.800948055, -6.548784122), (-10.230762125, -5.854627451))
            Line((-10.230762125, -5.854627451), (-11.061549888, -6.19875101))
            ThreePointArc((-11.061549888, -6.19875101), (-11.714792472, -4.852425922), (-12.20487581, -3.438518062))
            Line((-12.20487581, -3.438518062), (-11.374088047, -3.094394503))
            ThreePointArc((-11.374088047, -3.094394503), (-11.561006493, -2.299627171), (-11.692460658, -1.493827307))
            Line((-11.692460658, -1.493827307), (-12.591698852, -1.493827307))
            ThreePointArc((-12.591698852, -1.493827307), (-12.68, 0), (-12.591698852, 1.493827307))
            Line((-12.591698852, 1.493827307), (-11.692460658, 1.493827307))
            ThreePointArc((-11.692460658, 1.493827307), (-11.561006493, 2.299627171), (-11.374088047, 3.094394503))
            Line((-11.374088047, 3.094394503), (-12.20487581, 3.438518062))
            ThreePointArc((-12.20487581, 3.438518062), (-11.714792472, 4.852425922), (-11.061549888, 6.19875101))
            Line((-11.061549888, 6.19875101), (-10.230762125, 5.854627451))
            ThreePointArc((-10.230762125, 5.854627451), (-9.800948055, 6.548784122), (-9.324113638, 7.211522801))
            Line((-9.324113638, 7.211522801), (-9.959971063, 7.847380226))
            ThreePointArc((-9.959971063, 7.847380226), (-8.966113985, 8.966113985), (-7.847380226, 9.959971063))
            Line((-7.847380226, 9.959971063), (-7.211522801, 9.324113638))
            ThreePointArc((-7.211522801, 9.324113638), (-6.548784122, 9.800948055), (-5.854627451, 10.230762125))
            Line((-5.854627451, 10.230762125), (-6.19875101, 11.061549888))
            ThreePointArc((-6.19875101, 11.061549888), (-4.852425922, 11.714792472), (-3.438518062, 12.20487581))
        make_face(mode=Mode.SUBTRACT)
    extrude(amount=BOSS_EXTRUDE1_4_DEPTH)

    # Boss-Extrude1 5 outline → Boss-Extrude1 5 (revolve)
    with BuildSketch(Plane.YX):
        Polygon((11.7875, 12.0000001), (11.7875, 11), (13.25, 11), (14.25, 12), align=None)
    revolve(axis=Axis((0, 0, 0), (1, 0, 0)))

    # Sketch5 → Boss-Extrude3 (add)
    with BuildSketch(Plane(origin=(13, 0, 0), x_dir=(0, 0, -1), z_dir=(1, 0, 0))):
        with Locations(Location((0, 0, 0), (0, 0, 180))):
            Circle(SKETCH5_R)
    extrude(amount=-BOSS_EXTRUDE3_DEPTH)

    # Sketch6 → Boss-Extrude4 (add)
    with BuildSketch(Plane(origin=(13, 0, 0), x_dir=(0, 0, -1), z_dir=(1, 0, 0))):
        Circle(SKETCH6_R)
    extrude(amount=BOSS_EXTRUDE4_DEPTH)

    # Chamfer1
    chamfer1_edges = [part.edges().sort_by_distance(p)[0] for p in [
        (1, 0, -16),
        (11, 0, -16),
    ]]
    chamfer(chamfer1_edges, length=CHAMFER1_SIZE)

    # Sketch2 → Cut-Extrude1 (cut)
    with BuildSketch(Plane(origin=(25, 0, 0), x_dir=(0, 0, -1), z_dir=(1, 0, 0)).offset(CUT_EXTRUDE1_START)):
        Circle(SKETCH2_R)
        Circle(SKETCH2_R_2, mode=Mode.SUBTRACT)
    extrude(amount=CUT_EXTRUDE1_DEPTH, mode=Mode.SUBTRACT)

    # Sketch4 → Cut-Extrude2 (cut, two sides: drawn at the far end of the back side and taken through both)
    with BuildSketch(Plane(origin=(15, 0, 0), x_dir=(0, 0, -1), z_dir=(1, 0, 0)).offset(-CUT_EXTRUDE2_DEPTH_BACK)):
        Circle(SKETCH4_R)
    extrude(amount=CUT_EXTRUDE2_DEPTH + CUT_EXTRUDE2_DEPTH_BACK, mode=Mode.SUBTRACT)

    # Sketch7 → Cut-Extrude3 (cut)
    with BuildSketch(Plane(origin=(25, 0, 0), x_dir=(0, 0, -1), z_dir=(1, 0, 0)).offset(CUT_EXTRUDE3_START)):
        Circle(SKETCH7_R)
    extrude(amount=CUT_EXTRUDE3_DEPTH, mode=Mode.SUBTRACT)

    # Chamfer2
    chamfer2_edges = [part.edges().sort_by_distance(p)[0] for p in [
        (15, 0, 10),
        (-1, 0, 5),
        (19, 0, 7.5),
        (19, 0, 5),
    ]]
    chamfer(chamfer2_edges, length=CHAMFER2_SIZE)

    # Sketch8 → Cut-Extrude4 (cut, through all)
    with BuildSketch(Plane(origin=(19, 0, 0), x_dir=(0, 0, -1), z_dir=(1, 0, 0))):
        with Locations((0, 5)):
            Rectangle(SKETCH8_W, SKETCH8_H)
    extrude(amount=-CUT_EXTRUDE4_DEPTH, mode=Mode.SUBTRACT)


solid = part.part
